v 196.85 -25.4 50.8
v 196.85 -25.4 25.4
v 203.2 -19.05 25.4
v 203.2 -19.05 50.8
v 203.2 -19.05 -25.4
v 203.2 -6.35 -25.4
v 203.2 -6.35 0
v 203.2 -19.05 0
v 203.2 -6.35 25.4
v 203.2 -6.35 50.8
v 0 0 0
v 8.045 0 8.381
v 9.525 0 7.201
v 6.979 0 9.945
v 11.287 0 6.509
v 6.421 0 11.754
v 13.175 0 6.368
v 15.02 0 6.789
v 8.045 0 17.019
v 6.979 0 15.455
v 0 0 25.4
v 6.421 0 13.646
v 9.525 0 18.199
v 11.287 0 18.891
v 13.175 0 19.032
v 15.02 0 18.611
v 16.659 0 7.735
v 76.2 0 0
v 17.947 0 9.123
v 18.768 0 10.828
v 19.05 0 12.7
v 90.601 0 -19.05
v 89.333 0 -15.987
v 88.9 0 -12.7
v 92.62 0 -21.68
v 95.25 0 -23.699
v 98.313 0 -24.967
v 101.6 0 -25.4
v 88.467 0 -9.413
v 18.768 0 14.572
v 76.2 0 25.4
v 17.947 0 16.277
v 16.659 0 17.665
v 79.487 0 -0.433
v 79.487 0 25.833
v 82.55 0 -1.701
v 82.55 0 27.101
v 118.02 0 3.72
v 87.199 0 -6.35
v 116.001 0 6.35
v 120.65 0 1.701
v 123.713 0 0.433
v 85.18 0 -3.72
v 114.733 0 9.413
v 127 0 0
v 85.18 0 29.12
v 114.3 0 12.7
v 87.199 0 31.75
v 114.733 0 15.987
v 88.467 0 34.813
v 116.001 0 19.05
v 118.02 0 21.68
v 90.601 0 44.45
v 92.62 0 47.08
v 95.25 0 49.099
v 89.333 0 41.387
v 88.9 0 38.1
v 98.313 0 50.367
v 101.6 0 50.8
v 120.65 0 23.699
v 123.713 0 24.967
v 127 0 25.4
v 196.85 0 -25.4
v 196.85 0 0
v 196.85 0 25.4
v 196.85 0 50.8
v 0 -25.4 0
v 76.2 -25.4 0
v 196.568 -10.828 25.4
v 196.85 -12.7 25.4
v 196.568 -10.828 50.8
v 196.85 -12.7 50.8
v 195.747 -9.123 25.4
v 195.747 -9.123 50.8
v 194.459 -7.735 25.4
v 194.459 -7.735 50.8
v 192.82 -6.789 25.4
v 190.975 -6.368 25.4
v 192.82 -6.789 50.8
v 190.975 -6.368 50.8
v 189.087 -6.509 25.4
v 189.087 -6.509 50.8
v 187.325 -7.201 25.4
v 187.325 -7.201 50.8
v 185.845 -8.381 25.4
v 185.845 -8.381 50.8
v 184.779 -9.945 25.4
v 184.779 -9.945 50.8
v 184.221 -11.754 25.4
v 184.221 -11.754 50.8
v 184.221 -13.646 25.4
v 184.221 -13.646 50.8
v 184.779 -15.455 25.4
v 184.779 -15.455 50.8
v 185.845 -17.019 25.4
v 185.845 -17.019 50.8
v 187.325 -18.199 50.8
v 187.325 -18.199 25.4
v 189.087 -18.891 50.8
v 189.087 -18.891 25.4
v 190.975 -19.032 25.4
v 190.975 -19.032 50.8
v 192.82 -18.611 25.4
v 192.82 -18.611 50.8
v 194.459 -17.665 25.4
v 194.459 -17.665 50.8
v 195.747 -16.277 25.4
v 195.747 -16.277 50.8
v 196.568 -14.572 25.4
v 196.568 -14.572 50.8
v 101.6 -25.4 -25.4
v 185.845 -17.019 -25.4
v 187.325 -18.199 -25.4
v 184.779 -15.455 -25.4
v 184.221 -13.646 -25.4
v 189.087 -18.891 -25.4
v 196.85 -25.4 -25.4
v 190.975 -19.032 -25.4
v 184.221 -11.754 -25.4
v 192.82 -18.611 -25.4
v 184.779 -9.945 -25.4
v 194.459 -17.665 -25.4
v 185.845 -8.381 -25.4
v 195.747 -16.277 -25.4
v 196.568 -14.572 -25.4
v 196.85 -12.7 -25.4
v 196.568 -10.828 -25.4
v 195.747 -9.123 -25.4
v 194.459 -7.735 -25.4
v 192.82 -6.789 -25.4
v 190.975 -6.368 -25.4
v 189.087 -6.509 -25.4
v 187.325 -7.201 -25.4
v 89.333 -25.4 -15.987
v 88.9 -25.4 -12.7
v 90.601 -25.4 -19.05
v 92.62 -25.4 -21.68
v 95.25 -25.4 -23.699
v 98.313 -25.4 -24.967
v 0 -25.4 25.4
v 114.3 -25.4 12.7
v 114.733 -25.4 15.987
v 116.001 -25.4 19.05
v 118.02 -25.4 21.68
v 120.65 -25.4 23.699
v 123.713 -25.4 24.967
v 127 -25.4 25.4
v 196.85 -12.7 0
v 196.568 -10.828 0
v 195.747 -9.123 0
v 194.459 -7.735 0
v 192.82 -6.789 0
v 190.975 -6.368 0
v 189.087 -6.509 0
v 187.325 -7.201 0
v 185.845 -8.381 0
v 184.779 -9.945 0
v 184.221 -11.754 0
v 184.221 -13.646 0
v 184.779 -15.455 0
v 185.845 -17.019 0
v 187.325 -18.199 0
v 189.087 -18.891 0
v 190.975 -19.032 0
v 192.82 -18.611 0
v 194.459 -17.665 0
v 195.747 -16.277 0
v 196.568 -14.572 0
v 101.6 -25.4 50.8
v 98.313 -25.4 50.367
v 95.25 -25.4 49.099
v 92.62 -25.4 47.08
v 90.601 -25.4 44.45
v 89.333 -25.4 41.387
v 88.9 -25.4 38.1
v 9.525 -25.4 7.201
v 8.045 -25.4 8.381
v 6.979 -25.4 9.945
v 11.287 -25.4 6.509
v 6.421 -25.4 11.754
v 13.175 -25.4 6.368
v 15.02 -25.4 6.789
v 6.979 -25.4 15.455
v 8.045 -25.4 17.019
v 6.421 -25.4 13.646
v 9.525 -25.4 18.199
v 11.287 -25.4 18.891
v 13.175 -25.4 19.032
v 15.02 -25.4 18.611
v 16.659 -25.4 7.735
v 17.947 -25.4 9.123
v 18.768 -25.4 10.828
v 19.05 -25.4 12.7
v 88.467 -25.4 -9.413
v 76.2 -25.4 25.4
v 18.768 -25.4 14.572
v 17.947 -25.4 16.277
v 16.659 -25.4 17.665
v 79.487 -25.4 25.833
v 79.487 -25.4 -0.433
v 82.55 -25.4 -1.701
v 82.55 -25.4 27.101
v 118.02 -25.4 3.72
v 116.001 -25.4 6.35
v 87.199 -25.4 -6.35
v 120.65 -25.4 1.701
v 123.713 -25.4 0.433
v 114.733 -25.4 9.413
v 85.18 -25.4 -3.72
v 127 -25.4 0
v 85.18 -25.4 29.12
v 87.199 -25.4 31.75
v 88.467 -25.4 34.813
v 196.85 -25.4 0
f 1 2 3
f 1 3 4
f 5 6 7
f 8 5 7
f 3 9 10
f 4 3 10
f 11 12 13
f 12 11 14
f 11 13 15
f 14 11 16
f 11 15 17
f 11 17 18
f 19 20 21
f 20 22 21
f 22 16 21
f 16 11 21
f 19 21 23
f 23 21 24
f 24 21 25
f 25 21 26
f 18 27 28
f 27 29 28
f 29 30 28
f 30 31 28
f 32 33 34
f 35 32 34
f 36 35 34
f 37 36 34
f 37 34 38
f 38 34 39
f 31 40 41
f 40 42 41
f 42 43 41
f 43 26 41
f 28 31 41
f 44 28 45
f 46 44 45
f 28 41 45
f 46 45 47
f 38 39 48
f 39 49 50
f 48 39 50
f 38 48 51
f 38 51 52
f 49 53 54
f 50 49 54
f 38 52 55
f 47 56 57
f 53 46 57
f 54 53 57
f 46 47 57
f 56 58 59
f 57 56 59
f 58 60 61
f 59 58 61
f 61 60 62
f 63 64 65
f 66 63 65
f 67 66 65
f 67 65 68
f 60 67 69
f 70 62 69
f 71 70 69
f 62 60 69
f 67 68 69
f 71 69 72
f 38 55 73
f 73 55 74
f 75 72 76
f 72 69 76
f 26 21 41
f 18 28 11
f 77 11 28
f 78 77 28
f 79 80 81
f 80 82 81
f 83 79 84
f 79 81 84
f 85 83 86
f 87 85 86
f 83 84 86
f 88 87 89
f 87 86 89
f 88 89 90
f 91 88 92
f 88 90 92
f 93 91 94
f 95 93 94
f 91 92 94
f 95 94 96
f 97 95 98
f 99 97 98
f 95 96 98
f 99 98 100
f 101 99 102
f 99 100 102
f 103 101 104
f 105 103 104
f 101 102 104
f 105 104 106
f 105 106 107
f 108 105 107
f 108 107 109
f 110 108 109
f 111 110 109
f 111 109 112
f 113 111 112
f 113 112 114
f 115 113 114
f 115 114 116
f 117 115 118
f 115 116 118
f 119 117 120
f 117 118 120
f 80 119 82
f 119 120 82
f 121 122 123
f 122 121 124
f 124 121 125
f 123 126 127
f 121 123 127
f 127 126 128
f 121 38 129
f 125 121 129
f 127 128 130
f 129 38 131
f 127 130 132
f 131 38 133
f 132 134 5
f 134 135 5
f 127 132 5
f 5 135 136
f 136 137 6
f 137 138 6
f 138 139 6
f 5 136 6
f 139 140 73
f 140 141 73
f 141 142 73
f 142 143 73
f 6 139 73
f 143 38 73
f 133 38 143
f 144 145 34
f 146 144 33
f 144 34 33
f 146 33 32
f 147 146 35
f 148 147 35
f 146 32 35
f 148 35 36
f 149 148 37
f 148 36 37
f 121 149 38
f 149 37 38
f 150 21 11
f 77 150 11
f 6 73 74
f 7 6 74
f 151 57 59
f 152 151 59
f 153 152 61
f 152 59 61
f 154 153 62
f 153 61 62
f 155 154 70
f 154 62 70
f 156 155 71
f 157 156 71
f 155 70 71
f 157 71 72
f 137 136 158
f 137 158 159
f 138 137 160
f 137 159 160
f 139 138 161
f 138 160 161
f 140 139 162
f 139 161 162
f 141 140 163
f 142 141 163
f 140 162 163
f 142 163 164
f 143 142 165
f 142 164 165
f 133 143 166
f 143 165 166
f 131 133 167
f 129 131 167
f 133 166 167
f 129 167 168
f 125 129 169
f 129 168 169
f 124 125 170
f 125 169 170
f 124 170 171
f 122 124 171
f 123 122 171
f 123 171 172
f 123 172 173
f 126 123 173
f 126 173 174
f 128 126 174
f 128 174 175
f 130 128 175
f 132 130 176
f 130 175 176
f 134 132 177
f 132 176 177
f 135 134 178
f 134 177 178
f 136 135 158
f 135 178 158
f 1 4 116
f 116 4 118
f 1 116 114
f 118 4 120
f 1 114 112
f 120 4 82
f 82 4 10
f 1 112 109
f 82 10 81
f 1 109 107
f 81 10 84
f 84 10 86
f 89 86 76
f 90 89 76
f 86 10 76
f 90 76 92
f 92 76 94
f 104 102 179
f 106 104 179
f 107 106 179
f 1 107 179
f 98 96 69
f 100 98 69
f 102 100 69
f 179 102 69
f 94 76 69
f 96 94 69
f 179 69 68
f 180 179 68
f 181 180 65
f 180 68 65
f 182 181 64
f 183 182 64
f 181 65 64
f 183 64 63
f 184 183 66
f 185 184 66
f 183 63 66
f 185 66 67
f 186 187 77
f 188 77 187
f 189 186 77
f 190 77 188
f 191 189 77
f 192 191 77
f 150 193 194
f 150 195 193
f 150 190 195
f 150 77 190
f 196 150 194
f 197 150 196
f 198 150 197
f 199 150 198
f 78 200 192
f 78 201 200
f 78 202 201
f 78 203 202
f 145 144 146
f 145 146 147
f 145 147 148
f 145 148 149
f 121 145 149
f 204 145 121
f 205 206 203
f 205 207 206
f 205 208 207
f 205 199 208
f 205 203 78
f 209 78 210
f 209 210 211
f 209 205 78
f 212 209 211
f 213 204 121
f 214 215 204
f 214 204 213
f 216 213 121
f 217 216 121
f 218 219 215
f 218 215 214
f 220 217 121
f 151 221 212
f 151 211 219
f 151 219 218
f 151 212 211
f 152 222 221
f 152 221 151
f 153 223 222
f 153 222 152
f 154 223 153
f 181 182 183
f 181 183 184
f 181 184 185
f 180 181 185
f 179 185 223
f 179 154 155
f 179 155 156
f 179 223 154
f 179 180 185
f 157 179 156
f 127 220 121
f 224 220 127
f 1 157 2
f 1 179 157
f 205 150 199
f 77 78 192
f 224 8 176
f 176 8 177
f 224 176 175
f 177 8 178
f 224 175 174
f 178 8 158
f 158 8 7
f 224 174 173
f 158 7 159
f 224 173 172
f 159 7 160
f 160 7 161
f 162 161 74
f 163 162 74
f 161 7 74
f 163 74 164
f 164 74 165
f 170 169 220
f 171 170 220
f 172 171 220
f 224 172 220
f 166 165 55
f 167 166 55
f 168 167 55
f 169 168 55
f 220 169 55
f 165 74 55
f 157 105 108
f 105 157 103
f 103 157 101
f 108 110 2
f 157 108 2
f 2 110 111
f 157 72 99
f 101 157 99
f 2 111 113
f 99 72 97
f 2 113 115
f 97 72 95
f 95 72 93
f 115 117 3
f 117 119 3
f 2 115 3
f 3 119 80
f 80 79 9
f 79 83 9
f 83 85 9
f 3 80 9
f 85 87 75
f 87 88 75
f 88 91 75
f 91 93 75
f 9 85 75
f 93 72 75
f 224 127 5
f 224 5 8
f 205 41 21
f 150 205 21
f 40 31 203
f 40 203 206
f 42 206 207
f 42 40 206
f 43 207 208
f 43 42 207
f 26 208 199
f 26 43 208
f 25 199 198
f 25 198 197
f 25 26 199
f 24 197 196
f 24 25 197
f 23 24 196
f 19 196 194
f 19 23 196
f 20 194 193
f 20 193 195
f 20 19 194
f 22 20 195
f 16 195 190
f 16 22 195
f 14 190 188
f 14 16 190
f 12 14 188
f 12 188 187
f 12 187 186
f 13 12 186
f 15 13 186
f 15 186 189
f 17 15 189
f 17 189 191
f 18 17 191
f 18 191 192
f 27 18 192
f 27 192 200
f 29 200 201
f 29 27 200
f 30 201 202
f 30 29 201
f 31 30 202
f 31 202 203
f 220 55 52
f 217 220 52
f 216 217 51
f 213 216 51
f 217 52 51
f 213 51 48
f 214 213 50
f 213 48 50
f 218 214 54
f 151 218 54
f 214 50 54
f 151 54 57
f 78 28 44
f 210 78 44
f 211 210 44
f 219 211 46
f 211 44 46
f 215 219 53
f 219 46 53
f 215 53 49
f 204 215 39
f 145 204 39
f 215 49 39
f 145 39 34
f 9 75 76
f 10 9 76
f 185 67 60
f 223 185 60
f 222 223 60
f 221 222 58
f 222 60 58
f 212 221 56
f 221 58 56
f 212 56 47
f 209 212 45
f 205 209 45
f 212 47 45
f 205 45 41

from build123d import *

# Parameters (mm, degrees)
F0_R     = 6.35
F2_DEPTH = 25.4
F3_SIZE2 = 6.35
F3_SIZE  = 6.35
F1_R     = 6.35
F4_DEPTH = 127


with BuildPart() as f2:
    # F0 (on Front) → F2 (new body)
    with BuildSketch(Plane.XZ):
        with BuildLine():
            Line((0, 25.4), (0, 0))
            Line((0, 0), (76.2, 0))
            ThreePointArc((76.2, 0), (85.180256, -3.719744), (88.9, -12.7))
            ThreePointArc((88.9, -12.7), (92.619744, -21.680256), (101.6, -25.4))
            Line((101.6, -25.4), (203.2, -25.4))
            Line((203.2, -25.4), (203.2, 0))
            Line((203.2, 0), (127, 0))
            ThreePointArc((127, 0), (118.019744, 3.719744), (114.3, 12.7))
            ThreePointArc((114.3, 12.7), (118.019744, 21.680256), (127, 25.4))
            Line((127, 25.4), (203.2, 25.4))
            Line((203.2, 25.4), (203.2, 50.8))
            Line((203.2, 50.8), (101.6, 50.8))
            ThreePointArc((101.6, 50.8), (92.619744, 47.080256), (88.9, 38.1))
            ThreePointArc((88.9, 38.1), (85.180256, 29.119744), (76.2, 25.4))
            Line((76.2, 25.4), (0, 25.4))
        make_face()
        with Locations((12.7, 12.7)):
            Circle(F0_R, mode=Mode.SUBTRACT)
    extrude(amount=F2_DEPTH)

    # F3
    f3_edges = [f2.edges().sort_by_distance(p)[0] for p in [
        (203.2, -25.4, 38.1),
        (203.2, -25.4, -12.7),
        (203.2, 0, -12.7),
        (203.2, 0, 38.1),
    ]]
    chamfer(f3_edges, length=F3_SIZE, length2=F3_SIZE2)

    # F1 (on Top) → F4 (cut, symmetric)
    with BuildSketch(Plane.XY):
        with Locations((190.5, -12.7)):
            Circle(F1_R)
    extrude(amount=F4_DEPTH, both=True, mode=Mode.SUBTRACT)


solid = f2.part
